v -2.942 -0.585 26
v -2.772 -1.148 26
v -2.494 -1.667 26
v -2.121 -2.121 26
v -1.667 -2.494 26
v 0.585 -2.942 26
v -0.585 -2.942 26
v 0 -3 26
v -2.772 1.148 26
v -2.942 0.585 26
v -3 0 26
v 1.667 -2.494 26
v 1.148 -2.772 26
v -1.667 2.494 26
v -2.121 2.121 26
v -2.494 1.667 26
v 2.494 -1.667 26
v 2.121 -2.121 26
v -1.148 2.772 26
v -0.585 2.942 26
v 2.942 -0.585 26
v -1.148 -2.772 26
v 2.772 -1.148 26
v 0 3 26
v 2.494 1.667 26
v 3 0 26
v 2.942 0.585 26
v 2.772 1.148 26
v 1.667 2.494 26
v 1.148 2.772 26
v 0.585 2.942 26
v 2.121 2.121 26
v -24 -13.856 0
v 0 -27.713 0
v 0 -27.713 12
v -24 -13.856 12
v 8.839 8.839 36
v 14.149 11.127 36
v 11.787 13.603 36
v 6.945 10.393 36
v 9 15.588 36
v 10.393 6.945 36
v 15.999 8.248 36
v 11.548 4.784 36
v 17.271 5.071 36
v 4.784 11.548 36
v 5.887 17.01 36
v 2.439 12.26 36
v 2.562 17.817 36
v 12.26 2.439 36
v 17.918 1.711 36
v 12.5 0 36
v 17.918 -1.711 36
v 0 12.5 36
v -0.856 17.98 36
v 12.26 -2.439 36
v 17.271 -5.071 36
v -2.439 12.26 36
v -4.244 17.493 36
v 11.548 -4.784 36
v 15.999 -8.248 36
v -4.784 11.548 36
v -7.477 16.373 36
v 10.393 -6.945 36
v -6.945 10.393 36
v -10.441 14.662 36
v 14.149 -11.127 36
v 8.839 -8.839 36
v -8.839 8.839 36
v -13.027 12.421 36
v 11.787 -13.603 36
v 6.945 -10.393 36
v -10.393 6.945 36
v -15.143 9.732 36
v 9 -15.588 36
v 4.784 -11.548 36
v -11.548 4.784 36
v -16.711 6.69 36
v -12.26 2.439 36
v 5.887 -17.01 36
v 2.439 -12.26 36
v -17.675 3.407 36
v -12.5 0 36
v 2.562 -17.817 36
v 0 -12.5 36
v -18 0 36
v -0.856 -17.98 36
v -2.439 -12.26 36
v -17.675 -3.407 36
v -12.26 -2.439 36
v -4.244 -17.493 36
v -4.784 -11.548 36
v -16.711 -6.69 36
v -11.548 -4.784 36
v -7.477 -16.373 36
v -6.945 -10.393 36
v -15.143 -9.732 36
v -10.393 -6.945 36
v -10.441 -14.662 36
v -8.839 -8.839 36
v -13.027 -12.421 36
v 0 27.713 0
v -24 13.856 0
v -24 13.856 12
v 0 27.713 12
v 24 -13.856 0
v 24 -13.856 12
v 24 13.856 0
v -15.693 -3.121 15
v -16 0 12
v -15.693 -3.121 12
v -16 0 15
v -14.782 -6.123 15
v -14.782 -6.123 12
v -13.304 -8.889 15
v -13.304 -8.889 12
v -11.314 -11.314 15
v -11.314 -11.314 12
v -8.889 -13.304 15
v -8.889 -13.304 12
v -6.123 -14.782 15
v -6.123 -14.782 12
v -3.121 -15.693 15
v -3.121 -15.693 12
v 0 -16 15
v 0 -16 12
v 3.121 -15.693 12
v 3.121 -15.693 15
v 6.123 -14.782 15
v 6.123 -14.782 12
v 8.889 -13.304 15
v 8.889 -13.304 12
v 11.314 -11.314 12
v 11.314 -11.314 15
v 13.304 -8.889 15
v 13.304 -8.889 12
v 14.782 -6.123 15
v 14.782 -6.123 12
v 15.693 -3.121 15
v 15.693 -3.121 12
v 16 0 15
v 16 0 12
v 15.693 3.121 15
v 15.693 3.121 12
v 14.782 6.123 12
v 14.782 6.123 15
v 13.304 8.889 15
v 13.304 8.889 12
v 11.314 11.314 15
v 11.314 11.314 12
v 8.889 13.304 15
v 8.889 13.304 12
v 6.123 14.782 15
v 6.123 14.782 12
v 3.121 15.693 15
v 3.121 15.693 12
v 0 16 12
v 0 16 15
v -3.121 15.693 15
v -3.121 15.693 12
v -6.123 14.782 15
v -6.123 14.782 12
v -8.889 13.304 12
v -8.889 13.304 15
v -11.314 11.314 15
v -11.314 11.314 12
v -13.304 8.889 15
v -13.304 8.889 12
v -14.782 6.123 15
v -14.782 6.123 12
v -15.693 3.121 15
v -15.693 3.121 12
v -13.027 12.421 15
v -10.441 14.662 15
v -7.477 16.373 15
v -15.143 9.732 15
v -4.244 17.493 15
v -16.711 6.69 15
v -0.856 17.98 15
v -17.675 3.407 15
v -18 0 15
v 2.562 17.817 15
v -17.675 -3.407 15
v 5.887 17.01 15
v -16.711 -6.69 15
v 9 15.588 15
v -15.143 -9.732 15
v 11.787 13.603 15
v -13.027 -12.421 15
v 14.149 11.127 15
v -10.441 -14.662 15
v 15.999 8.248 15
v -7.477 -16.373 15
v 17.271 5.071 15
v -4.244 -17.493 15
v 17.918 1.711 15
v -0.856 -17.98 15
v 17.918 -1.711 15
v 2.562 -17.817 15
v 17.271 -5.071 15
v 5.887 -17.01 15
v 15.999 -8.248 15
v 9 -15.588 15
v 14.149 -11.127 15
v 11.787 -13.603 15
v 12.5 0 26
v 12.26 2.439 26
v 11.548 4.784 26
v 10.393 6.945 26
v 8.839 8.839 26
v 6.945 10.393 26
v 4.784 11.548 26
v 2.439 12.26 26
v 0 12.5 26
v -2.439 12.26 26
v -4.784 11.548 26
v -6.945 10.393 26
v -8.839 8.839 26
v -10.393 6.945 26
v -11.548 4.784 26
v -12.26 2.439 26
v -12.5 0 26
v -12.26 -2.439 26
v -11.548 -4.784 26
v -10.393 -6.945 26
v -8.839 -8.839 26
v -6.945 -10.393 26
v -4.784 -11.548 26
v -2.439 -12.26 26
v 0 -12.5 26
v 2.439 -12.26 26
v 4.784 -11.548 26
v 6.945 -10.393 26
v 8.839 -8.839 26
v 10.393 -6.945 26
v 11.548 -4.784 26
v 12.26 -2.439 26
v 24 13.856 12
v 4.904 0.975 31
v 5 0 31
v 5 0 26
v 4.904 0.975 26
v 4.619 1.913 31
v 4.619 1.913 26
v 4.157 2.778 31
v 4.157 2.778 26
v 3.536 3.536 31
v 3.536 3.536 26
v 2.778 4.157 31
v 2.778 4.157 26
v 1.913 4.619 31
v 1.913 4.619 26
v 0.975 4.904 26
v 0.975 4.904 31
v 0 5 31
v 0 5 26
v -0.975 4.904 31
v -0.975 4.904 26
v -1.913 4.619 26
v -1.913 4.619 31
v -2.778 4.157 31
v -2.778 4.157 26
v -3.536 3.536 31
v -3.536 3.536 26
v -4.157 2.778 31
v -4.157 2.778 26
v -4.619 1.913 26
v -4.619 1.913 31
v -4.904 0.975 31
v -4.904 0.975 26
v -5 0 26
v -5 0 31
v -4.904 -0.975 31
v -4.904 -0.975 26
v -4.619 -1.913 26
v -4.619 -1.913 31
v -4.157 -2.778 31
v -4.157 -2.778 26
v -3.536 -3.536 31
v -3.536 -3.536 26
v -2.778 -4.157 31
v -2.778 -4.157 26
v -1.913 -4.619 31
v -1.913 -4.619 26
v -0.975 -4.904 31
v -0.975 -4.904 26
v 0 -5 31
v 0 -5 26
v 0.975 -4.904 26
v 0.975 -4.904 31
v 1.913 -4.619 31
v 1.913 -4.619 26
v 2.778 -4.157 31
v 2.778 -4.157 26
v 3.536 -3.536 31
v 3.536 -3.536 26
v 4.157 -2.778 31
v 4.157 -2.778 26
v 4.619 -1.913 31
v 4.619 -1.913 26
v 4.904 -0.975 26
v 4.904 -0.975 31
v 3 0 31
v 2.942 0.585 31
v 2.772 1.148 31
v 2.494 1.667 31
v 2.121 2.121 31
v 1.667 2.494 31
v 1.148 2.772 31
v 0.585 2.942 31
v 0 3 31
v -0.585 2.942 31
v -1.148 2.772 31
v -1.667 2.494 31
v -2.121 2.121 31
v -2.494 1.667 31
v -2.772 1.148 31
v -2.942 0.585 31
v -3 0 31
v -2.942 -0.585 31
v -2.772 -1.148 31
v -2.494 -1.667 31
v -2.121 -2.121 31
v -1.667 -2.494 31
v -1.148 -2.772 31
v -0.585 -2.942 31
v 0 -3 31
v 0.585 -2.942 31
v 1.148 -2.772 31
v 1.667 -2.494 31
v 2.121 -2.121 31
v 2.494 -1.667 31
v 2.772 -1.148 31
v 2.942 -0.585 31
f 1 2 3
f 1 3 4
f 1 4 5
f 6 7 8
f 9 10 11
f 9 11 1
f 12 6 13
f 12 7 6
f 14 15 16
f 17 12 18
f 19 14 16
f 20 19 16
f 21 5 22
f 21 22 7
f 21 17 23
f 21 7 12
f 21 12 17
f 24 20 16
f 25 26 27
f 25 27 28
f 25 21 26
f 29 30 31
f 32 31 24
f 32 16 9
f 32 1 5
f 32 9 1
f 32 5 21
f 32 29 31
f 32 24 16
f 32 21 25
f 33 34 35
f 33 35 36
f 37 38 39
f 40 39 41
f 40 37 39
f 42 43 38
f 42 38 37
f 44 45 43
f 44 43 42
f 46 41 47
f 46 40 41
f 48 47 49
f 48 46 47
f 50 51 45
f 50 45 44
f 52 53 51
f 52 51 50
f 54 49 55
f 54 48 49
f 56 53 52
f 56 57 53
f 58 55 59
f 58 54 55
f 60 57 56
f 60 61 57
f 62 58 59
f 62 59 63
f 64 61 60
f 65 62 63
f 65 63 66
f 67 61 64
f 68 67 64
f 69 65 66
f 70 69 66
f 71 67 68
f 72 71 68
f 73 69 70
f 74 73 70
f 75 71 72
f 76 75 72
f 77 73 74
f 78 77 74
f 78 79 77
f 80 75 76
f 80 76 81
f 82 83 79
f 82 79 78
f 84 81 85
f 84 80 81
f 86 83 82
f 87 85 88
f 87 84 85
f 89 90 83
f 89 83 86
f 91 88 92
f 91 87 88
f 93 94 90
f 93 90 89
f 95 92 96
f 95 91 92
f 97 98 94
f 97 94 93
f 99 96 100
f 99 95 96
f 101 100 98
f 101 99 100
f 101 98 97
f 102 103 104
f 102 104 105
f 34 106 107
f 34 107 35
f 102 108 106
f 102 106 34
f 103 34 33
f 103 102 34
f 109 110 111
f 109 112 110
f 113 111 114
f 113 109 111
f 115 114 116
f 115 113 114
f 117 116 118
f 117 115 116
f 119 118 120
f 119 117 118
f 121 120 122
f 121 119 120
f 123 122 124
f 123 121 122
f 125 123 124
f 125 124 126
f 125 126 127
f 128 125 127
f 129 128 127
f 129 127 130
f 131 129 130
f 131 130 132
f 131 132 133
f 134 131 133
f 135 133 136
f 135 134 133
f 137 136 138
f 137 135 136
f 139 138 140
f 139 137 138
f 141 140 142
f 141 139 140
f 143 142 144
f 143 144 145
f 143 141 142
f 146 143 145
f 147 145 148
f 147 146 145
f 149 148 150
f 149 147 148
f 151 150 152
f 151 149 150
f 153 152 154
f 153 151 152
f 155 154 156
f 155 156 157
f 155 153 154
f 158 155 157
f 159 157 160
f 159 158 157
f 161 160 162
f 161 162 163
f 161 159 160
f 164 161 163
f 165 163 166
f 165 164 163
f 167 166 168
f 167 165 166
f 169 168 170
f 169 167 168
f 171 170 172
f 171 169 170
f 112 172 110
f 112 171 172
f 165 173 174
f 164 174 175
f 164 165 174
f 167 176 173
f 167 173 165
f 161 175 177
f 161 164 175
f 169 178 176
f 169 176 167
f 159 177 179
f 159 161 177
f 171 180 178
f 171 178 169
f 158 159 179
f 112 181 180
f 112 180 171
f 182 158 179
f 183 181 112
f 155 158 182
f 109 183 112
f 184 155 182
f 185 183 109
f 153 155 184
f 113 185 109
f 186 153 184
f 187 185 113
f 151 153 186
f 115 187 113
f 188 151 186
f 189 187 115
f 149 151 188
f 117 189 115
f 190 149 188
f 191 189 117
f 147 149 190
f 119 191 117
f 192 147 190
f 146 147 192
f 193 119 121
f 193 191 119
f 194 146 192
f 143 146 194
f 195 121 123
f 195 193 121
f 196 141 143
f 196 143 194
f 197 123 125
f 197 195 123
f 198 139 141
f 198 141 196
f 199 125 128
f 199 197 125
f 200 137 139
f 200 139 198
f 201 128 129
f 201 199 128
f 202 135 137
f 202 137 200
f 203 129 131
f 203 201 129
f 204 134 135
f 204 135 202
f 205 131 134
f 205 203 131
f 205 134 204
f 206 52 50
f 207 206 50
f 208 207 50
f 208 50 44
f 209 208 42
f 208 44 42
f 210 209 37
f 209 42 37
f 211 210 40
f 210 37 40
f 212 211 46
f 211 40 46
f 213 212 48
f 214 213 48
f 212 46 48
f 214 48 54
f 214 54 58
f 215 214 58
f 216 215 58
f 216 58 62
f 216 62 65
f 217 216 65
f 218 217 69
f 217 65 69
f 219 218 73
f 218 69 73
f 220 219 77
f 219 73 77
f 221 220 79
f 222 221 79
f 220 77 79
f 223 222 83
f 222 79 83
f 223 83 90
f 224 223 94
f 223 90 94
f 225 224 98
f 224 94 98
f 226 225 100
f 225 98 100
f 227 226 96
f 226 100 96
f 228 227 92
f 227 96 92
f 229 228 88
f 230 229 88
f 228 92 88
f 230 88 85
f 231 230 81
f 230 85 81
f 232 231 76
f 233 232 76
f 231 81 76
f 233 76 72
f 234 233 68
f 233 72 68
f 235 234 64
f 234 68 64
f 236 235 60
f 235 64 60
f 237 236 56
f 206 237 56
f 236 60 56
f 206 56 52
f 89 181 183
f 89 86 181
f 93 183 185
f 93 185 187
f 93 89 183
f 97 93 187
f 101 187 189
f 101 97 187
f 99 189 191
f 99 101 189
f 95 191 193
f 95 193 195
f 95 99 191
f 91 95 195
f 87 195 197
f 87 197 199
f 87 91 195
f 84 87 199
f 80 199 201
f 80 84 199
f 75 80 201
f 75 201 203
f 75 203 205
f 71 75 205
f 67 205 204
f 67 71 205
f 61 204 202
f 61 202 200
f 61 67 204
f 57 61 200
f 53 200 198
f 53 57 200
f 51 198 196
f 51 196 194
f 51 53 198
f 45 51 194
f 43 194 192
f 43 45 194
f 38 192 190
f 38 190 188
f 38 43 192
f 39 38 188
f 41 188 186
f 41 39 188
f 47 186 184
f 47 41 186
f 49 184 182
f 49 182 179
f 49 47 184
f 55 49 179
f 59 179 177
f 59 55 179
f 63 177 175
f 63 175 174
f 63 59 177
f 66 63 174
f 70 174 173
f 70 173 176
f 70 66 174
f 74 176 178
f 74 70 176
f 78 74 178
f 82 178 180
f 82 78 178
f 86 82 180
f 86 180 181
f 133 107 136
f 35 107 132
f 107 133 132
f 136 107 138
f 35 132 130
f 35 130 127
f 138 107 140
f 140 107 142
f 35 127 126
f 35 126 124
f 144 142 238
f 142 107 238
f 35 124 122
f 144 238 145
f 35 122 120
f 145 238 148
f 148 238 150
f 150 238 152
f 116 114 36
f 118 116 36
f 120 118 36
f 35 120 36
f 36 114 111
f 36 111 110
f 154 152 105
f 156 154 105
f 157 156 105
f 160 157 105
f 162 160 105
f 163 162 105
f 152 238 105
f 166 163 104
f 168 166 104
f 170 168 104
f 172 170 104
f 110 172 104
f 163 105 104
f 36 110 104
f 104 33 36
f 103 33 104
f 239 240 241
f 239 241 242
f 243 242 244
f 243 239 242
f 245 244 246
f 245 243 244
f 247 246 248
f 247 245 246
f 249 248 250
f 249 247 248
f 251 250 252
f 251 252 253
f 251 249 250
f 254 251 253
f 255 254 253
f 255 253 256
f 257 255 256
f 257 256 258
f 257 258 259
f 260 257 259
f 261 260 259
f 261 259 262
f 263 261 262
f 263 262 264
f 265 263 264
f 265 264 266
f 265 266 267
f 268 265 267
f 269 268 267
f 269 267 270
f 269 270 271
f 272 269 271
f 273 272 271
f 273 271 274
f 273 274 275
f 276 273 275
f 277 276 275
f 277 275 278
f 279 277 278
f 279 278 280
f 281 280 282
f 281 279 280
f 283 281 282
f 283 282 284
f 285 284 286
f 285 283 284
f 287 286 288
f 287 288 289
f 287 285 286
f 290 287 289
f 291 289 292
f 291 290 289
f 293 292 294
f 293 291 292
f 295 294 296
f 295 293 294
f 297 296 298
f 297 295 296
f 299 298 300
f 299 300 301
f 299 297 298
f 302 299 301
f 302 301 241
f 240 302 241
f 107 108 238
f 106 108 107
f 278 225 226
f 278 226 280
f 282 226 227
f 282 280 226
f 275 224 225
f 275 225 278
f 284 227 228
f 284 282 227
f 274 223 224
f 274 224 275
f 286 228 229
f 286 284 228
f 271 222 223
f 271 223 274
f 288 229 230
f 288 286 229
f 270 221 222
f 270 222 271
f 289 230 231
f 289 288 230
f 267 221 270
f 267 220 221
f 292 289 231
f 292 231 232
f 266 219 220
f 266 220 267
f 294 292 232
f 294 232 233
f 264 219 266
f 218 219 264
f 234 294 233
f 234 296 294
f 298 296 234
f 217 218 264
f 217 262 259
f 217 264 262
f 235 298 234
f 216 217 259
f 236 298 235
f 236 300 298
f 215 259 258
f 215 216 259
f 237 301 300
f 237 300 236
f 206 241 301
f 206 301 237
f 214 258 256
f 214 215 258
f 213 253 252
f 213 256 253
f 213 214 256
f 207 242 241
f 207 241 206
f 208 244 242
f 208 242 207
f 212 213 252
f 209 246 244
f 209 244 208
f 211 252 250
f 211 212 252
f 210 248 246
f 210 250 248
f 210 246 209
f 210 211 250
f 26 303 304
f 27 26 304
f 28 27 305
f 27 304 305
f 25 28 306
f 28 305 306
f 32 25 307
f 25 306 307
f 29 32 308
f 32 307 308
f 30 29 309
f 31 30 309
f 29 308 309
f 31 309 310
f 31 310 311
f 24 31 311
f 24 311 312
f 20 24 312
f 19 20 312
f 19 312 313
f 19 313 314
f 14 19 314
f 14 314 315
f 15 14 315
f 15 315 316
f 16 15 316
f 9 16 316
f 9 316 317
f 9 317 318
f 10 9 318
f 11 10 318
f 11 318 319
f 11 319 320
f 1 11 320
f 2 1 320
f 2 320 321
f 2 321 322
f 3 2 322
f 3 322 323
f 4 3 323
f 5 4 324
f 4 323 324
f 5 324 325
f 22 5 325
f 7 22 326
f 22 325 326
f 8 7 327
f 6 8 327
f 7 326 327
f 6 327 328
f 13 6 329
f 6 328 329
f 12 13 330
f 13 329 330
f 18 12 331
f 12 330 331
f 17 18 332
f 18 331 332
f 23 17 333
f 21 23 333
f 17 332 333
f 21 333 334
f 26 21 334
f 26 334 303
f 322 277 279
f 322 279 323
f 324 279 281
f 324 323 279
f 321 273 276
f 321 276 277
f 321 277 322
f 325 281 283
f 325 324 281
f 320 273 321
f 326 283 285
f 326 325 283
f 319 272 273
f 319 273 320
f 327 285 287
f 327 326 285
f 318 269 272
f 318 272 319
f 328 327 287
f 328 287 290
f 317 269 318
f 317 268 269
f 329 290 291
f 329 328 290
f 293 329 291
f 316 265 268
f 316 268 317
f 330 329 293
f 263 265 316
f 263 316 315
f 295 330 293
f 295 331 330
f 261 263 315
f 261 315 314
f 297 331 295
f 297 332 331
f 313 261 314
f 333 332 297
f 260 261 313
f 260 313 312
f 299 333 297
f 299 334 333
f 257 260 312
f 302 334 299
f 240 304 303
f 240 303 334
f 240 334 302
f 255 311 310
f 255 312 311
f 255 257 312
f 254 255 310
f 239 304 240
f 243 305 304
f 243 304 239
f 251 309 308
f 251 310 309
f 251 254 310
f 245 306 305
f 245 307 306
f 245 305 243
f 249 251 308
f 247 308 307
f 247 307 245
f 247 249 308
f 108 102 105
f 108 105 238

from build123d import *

# Parameters (mm, degrees)
SKETCH_2_R          = 12.5
SKETCH_2_R_2        = 5
CUT_EXTRUDE_1_DEPTH = 10
SKETCH_3_R          = 3
CUT_EXTRUDE_2_DEPTH = 10
SKETCH_4_R          = 5
CUT_EXTRUDE_3_DEPTH = 5
EXTRUDE_1_DEPTH     = 12


with BuildPart() as part:
    # 草图1 → 旋转1 (revolve)
    with BuildSketch(Plane(origin=(0, 0, 0), x_dir=(0, 0, -1), z_dir=(1, 0, 0)), mode=Mode.PRIVATE) as revolve_1_sk:
        Polygon((0, 0), (0, 24), (-12, 24), (-12, 16), (-15, 16), (-15, 18), (-36, 18), (-36, 0), align=None)
    revolve(revolve_1_sk.sketch.rotate(Axis((0, 0, 0), (0, 0, 1)), 90), axis=Axis((0, 0, 0), (0, 0, 1)))

    # 草图2 → 切除-拉伸1 (cut)
    with BuildSketch(Plane.XY.offset(36)):
        Circle(SKETCH_2_R)
        Circle(SKETCH_2_R_2, mode=Mode.SUBTRACT)
    extrude(amount=-CUT_EXTRUDE_1_DEPTH, mode=Mode.SUBTRACT)

    # 草图3 → 切除-拉伸2 (cut)
    with BuildSketch(Plane.XY.offset(36)):
        Circle(SKETCH_3_R)
    extrude(amount=-CUT_EXTRUDE_2_DEPTH, mode=Mode.SUBTRACT)

    # 草图4 → 切除-拉伸3 (cut)
    with BuildSketch(Plane.XY.offset(36)):
        Circle(SKETCH_4_R)
    extrude(amount=-CUT_EXTRUDE_3_DEPTH, mode=Mode.SUBTRACT)

    # 草图5 → 凸台-拉伸1 (add)
    with BuildSketch(Plane(origin=(0, 0, 0), x_dir=(-1, 0, 0), z_dir=(0, 0, -1))):
        Polygon((0, 27.712812921), (-24, 13.856406461), (-24, -13.856406461), (0, -27.712812921), (24, -13.856406461), (24, 13.856406461), align=None)
    extrude(amount=-EXTRUDE_1_DEPTH)


solid = part.part
